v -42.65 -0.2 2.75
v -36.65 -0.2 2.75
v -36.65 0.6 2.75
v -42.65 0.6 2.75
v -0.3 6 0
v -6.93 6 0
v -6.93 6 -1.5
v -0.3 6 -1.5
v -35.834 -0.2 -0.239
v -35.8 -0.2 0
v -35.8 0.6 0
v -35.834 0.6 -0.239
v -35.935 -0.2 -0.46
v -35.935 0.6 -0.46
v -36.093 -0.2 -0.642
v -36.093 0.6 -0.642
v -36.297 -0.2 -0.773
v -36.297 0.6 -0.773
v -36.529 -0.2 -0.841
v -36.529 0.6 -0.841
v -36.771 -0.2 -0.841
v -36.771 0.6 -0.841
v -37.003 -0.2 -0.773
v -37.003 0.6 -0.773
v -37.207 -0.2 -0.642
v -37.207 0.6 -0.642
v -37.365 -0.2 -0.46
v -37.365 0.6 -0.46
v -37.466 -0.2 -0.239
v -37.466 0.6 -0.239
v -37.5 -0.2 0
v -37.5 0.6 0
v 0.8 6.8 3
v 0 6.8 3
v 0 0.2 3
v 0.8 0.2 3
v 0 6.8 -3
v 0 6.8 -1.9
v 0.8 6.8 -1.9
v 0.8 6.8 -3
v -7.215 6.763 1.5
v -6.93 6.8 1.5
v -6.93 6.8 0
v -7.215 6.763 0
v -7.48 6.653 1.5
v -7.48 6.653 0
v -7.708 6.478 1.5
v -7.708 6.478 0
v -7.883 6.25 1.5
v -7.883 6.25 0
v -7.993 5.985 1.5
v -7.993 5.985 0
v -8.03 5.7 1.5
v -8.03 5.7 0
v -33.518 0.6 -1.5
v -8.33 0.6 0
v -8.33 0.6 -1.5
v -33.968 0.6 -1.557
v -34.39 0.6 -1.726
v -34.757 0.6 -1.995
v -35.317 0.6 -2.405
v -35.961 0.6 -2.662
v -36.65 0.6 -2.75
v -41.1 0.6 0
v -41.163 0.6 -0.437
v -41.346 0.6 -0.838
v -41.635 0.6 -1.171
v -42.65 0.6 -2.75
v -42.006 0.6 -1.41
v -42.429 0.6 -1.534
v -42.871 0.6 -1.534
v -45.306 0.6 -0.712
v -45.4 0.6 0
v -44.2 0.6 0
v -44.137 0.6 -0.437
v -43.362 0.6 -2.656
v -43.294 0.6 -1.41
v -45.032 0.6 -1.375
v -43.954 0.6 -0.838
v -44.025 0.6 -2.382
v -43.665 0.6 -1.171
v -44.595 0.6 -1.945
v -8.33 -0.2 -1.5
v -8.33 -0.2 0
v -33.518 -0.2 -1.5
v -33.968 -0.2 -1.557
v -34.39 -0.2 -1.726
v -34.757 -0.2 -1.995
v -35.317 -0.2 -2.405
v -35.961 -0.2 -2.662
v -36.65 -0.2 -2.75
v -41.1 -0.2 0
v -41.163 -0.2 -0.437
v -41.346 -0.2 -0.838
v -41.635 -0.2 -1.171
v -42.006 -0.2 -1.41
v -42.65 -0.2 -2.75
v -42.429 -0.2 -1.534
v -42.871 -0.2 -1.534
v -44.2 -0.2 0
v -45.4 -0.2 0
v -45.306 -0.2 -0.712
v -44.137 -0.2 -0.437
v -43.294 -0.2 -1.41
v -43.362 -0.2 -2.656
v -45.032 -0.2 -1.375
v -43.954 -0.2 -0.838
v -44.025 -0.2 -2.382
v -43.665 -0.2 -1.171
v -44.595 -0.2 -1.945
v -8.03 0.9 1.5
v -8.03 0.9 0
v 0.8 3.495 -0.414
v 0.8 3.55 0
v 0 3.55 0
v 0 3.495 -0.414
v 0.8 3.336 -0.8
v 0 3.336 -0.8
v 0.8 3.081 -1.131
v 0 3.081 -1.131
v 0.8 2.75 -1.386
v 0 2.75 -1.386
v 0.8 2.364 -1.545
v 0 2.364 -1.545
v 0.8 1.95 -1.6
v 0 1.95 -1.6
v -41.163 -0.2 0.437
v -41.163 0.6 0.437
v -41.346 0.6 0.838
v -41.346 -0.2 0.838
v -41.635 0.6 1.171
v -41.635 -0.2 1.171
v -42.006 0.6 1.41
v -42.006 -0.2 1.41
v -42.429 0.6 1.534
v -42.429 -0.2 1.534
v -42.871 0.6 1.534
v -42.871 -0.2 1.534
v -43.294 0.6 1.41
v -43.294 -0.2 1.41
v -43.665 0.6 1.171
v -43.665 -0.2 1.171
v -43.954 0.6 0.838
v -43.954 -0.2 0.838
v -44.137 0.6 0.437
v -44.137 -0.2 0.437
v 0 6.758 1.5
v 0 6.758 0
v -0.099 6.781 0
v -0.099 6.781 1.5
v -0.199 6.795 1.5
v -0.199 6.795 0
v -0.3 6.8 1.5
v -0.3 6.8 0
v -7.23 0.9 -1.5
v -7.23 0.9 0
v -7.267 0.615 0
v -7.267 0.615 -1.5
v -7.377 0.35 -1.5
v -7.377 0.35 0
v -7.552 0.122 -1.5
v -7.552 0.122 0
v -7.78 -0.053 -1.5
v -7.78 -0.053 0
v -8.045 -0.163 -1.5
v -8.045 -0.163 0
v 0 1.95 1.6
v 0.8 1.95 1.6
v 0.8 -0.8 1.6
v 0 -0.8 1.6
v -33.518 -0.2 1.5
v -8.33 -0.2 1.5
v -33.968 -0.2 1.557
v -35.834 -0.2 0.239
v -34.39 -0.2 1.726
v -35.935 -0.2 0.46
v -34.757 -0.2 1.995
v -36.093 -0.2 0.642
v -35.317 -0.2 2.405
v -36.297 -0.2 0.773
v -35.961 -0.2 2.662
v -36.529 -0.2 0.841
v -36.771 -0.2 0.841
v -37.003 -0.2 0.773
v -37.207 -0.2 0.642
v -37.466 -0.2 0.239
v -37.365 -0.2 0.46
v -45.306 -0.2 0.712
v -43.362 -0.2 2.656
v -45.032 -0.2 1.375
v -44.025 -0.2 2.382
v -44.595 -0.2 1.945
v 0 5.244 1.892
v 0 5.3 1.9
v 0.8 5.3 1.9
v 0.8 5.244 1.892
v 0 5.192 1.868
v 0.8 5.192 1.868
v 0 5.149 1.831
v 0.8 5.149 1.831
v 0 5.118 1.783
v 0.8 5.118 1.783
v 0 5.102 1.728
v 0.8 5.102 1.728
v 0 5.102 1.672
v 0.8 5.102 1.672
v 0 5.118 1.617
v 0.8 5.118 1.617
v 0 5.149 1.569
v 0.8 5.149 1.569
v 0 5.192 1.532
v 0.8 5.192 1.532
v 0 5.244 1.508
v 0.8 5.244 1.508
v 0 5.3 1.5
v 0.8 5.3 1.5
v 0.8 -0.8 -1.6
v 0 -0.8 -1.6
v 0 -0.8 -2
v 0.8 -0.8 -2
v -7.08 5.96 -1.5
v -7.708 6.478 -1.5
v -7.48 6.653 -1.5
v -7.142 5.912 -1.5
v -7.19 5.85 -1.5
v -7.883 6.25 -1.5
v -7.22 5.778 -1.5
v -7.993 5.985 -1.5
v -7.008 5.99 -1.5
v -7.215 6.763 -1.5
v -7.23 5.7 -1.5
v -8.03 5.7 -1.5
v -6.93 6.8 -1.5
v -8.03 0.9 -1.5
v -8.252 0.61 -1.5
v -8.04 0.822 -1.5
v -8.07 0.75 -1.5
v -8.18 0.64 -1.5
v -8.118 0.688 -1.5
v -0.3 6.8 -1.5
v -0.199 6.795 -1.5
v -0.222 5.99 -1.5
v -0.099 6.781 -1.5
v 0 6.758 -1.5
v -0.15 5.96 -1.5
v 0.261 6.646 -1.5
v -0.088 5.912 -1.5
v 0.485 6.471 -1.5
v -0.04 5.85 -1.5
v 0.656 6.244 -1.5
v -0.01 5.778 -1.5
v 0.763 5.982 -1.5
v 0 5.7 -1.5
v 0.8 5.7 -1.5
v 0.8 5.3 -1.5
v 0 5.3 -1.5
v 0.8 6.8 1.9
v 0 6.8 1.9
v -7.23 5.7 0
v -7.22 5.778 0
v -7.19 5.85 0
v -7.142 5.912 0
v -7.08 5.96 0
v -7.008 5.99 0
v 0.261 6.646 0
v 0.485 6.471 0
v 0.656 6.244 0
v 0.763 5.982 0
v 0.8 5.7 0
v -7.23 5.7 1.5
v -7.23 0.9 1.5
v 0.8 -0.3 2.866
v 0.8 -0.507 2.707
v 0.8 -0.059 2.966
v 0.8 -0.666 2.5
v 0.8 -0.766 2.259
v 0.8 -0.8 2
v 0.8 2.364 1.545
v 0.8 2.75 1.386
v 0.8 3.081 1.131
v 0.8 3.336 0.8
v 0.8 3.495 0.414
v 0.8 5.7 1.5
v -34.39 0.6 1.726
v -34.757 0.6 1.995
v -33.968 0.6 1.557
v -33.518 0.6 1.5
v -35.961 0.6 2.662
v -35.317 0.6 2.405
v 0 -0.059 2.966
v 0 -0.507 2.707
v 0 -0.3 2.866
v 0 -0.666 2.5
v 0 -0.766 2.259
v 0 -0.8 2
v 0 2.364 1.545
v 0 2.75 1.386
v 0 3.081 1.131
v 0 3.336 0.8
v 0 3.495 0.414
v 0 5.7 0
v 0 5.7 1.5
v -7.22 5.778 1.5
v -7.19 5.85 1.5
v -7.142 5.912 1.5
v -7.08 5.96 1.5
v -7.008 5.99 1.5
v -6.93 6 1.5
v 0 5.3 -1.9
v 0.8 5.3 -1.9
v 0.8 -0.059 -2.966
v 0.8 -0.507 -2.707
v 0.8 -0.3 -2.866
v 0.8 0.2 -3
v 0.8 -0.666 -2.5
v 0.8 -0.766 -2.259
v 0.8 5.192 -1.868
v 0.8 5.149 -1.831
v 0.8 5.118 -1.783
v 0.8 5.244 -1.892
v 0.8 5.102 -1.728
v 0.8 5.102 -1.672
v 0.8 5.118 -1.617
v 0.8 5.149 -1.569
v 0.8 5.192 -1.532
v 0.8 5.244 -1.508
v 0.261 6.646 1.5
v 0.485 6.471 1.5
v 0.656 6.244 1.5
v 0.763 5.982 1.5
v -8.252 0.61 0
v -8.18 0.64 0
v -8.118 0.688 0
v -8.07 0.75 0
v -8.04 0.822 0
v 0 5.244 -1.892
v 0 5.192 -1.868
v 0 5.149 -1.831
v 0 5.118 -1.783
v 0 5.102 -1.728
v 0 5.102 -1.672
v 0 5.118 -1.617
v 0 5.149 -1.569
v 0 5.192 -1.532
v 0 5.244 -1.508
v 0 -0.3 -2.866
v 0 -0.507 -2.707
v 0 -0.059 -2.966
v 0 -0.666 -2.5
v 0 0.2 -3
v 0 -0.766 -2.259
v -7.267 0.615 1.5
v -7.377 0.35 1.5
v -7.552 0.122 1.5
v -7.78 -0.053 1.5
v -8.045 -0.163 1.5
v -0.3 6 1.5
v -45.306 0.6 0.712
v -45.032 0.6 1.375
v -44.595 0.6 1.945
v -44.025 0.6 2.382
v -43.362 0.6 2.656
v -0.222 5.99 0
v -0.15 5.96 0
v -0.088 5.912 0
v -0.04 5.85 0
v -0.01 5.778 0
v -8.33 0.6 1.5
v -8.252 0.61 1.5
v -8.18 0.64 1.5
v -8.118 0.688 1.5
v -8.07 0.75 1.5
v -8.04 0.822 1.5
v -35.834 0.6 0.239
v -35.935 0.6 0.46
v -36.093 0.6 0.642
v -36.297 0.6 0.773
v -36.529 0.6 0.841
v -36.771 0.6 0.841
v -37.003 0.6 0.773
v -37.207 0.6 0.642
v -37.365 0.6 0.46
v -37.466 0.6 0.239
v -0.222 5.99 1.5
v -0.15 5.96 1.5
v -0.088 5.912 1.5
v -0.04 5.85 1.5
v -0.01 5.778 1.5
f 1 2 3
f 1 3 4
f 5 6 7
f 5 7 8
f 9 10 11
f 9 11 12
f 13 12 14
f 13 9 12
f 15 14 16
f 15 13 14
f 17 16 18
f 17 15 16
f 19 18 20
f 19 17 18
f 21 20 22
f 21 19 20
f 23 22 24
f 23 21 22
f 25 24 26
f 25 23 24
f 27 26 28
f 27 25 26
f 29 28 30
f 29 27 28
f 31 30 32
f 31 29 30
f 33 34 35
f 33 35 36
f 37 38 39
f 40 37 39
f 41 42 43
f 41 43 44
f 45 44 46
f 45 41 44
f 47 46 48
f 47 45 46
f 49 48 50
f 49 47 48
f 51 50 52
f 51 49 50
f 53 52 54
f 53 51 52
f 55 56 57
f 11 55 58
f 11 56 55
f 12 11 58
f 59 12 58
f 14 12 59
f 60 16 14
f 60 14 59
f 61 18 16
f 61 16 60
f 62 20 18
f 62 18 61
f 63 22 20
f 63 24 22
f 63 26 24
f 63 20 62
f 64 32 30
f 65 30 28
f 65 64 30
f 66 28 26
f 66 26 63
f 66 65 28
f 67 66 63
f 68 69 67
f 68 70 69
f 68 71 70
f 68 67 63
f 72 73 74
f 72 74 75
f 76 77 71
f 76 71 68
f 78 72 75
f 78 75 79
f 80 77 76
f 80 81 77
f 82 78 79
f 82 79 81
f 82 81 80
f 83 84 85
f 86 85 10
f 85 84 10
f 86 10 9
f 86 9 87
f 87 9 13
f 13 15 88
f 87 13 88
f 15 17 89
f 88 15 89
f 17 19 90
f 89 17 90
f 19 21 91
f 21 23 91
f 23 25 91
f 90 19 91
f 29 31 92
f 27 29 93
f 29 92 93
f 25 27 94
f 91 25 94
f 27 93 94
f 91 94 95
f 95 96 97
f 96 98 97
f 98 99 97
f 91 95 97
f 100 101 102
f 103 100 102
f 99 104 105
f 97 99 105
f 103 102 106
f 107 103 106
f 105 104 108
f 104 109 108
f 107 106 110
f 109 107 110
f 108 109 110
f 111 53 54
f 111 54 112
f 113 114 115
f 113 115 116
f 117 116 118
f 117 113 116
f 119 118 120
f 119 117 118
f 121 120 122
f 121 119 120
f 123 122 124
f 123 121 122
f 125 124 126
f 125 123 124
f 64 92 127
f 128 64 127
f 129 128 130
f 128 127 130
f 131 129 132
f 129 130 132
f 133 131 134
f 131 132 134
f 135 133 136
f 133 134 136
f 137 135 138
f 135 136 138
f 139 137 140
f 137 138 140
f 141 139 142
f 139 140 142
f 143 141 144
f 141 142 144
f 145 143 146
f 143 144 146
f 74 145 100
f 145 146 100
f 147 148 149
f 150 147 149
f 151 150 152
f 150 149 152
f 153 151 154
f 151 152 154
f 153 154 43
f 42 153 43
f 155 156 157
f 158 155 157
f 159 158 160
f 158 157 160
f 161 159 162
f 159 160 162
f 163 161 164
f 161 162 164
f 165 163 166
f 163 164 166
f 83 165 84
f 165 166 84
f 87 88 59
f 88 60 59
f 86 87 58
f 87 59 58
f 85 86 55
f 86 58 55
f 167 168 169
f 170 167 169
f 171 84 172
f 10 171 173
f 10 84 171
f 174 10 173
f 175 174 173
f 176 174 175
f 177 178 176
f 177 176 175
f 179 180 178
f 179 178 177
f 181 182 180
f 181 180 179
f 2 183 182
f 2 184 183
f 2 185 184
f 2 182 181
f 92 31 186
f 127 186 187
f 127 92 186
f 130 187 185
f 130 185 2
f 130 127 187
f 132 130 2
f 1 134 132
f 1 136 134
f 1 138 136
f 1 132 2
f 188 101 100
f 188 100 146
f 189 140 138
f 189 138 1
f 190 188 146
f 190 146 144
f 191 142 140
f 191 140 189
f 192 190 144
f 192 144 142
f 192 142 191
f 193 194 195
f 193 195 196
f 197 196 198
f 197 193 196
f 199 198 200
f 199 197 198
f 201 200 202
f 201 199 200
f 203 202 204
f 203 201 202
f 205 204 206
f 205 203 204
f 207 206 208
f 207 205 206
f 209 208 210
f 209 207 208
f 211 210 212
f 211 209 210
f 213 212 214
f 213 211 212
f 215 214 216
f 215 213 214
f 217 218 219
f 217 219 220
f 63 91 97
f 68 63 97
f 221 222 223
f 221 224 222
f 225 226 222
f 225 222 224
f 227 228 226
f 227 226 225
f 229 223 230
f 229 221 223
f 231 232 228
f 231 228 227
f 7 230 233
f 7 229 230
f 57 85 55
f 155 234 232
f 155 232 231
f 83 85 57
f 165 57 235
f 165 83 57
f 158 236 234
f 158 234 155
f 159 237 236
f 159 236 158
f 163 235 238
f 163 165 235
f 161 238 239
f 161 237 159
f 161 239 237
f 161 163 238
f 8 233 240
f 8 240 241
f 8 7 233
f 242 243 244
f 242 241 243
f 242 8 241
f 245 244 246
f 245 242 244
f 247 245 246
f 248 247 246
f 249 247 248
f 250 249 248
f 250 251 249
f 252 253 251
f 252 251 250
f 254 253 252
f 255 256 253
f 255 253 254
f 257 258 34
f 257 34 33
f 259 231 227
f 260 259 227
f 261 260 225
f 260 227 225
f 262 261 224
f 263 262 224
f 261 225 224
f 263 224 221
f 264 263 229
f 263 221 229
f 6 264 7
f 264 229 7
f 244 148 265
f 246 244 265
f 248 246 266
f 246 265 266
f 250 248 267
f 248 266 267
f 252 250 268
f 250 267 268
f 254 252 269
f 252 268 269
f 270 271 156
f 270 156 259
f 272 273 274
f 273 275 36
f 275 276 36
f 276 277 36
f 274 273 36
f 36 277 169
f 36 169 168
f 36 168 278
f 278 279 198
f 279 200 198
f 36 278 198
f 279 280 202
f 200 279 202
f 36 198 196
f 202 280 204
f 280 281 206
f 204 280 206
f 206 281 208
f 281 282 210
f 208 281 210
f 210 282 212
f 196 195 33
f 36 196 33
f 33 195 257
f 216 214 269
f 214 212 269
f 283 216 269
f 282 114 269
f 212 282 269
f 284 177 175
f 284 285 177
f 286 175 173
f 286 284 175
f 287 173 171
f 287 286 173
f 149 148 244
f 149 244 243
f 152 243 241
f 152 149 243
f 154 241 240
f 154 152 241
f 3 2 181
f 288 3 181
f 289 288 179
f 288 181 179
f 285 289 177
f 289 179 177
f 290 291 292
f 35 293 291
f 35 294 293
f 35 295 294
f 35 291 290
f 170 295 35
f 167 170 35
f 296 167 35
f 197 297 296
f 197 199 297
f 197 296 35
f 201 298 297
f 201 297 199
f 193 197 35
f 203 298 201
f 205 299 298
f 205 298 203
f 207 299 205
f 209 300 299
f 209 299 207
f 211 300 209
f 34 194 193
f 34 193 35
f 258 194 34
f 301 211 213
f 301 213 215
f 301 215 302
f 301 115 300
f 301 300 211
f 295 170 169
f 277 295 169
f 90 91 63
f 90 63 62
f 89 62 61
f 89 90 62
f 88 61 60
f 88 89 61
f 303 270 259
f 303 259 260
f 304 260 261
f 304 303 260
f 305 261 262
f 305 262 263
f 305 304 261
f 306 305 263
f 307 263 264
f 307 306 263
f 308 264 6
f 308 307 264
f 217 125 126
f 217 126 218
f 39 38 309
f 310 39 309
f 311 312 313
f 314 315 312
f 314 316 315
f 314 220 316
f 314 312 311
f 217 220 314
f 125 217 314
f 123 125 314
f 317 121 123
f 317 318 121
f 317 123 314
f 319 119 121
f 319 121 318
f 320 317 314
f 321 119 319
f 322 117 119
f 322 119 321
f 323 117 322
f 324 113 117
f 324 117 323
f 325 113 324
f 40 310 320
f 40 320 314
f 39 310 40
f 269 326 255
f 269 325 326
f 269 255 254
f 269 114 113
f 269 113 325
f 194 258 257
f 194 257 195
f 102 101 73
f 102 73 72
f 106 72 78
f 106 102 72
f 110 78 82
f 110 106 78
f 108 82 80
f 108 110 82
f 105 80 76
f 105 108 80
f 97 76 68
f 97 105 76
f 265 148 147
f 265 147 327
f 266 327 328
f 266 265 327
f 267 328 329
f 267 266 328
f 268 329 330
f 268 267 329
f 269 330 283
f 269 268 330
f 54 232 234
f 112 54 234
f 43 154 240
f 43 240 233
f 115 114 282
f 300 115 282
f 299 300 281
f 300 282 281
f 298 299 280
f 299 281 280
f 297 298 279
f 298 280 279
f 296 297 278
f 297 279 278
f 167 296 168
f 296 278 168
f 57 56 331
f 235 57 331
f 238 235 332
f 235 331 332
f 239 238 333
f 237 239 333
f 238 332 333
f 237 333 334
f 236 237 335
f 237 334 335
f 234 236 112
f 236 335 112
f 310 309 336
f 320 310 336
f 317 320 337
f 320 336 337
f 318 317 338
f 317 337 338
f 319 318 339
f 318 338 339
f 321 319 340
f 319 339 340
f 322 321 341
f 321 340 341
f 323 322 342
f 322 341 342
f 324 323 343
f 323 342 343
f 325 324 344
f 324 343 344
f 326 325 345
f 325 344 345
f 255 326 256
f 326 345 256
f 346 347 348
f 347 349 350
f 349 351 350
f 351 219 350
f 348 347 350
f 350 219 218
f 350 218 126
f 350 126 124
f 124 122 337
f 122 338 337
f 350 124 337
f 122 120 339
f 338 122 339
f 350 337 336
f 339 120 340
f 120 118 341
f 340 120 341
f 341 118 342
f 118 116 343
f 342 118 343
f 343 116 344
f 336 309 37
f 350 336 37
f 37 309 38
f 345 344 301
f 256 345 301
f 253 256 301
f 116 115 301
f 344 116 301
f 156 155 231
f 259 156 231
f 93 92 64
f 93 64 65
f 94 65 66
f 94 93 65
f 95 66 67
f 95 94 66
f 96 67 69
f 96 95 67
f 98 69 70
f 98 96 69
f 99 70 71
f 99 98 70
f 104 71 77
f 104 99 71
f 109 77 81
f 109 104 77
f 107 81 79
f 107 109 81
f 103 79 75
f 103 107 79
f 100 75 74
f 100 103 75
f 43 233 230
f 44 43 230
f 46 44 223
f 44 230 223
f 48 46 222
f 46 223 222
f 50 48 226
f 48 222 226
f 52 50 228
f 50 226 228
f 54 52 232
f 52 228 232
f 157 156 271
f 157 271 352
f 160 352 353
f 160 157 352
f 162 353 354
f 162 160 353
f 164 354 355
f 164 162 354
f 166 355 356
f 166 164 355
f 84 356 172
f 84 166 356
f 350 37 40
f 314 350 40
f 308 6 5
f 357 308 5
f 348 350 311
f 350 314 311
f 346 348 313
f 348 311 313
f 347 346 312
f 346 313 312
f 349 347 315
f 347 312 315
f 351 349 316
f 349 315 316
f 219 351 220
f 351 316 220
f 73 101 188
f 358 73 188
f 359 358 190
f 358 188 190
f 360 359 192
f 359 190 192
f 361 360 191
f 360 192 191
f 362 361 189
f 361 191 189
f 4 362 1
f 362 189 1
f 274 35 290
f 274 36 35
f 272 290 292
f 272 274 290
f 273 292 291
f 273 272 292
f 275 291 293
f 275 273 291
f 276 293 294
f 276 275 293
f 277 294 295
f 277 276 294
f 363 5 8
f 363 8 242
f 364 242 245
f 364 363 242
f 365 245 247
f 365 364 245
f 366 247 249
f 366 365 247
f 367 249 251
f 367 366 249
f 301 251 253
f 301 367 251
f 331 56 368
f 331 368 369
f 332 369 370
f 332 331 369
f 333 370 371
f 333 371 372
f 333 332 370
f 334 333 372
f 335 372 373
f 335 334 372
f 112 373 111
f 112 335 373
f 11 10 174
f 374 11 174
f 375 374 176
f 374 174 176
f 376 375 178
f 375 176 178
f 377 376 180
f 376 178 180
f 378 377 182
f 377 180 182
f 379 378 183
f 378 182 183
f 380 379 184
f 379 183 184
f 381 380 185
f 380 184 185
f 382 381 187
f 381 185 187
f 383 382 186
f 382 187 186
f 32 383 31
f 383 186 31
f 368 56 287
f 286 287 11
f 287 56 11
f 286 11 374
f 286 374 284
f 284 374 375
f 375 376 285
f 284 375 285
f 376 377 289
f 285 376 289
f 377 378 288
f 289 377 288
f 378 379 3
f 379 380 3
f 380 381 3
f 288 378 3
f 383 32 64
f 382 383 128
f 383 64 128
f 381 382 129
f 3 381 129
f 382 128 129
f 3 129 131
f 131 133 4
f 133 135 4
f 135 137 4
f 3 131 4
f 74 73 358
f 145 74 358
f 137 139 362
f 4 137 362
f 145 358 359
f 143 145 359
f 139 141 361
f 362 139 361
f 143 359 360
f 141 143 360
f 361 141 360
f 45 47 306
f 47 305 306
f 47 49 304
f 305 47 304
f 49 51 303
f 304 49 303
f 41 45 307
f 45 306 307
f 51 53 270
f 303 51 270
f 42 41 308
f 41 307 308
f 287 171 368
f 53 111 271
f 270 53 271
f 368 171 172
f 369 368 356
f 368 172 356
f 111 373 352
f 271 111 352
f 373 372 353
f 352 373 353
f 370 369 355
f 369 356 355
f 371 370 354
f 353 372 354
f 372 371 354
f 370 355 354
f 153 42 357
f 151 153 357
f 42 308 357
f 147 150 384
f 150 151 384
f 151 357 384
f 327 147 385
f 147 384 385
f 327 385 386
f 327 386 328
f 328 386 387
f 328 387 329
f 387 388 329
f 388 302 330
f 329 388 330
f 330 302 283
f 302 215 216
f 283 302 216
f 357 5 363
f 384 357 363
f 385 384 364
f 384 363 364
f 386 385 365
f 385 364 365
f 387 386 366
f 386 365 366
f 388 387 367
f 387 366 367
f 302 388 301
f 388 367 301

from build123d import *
from build123d.topology import SkipClean

# Parameters (mm, degrees)
SKETCH_20_W                      = 0.8
SKETCH_20_H                      = 7.6
SM_BASE_FLANGE_3_DEPTH           = 3
SM_EDGE_FLANGE_4_DEPTH           = 1.9
SM_EDGE_FLANGE_4_2_DEPTH         = 1.5
SM_EDGE_FLANGE_4_3_DEPTH         = 2
SM_EDGE_FLANGE_5_STRIP_W         = 3.8
SM_EDGE_FLANGE_5_STRIP_H         = 0.8
SM_EDGE_FLANGE_5_STRIP_CUT_DEPTH = 1.5
SM_EDGE_FLANGE_5_DEPTH           = 1.5
SM_EDGE_FLANGE_6_STRIP_W         = 3.8
SM_EDGE_FLANGE_6_STRIP_H         = 0.8
SM_EDGE_FLANGE_6_STRIP_CUT_DEPTH = 1.5
SM_EDGE_FLANGE_6_DEPTH           = 1.5
SM_EDGE_FLANGE_6_PROFILE_W       = 2.75
SM_EDGE_FLANGE_6_PROFILE_H       = 37.07
SM_EDGE_FLANGE_6_FLAT_DEPTH      = 0.8
CUT_EXTRUDE_3_DEPTH              = 47.034335012
CUT_EXTRUDE_4_REACH              = 48.794
FILLET_1_R                       = 1.8
FILLET_2_R                       = 1


with BuildPart() as part:
    # 基体-法兰3: sheet metal written as solids
    # 草图20 → 基体-法兰3 (new body)
    with BuildSketch(Plane.XY):
        with Locations((0.4, 3)):
            Rectangle(SKETCH_20_W, SKETCH_20_H)
    extrude(amount=SM_BASE_FLANGE_3_DEPTH)

    # 边线-法兰4: read off the stored shape, not the designer's step
    # 边线-法兰4 outline → 边线-法兰4 (cut)
    with BuildSketch(Plane.XY):
        with BuildLine():
            Line((0, 6.8), (0, 6.758300524))
            ThreePointArc((0, 6.758300524), (0.577496438, 6.363324958), (0.8, 5.7))
            Line((0.8, 5.7), (0.8, 6.8))
            Line((0.8, 6.8), (0, 6.8))
        make_face()
    extrude(amount=SM_EDGE_FLANGE_4_DEPTH, mode=Mode.SUBTRACT)

    # Sm Edge Flange 4 2 outline → Sm Edge Flange 4 2 (add)
    with BuildSketch(Plane.XY):
        with BuildLine():
            Line((-0.3, 6.8), (-8.03, 6.8))
            Line((-8.03, 6.8), (-8.03, 6))
            Line((-8.03, 6), (-0.3, 6))
            ThreePointArc((-0.3, 6), (-0.087867966, 5.912132034), (0, 5.7))
            Line((0, 5.7), (0, 6.758300524))
            ThreePointArc((0, 6.758300524), (-0.148557894, 6.789525258), (-0.3, 6.8))
        make_face()
    extrude(amount=SM_EDGE_FLANGE_4_2_DEPTH)

    # Sm Edge Flange 4 3 outline → Sm Edge Flange 4 3 (cut)
    with BuildSketch(Plane.YZ):
        with BuildLine():
            Line((5.3, 1.5), (8, 1.5))
            Line((8, 1.5), (8, 1.9))
            Line((8, 1.9), (5.3, 1.9))
            ThreePointArc((5.3, 1.9), (5.1, 1.7), (5.3, 1.5))
        make_face()
    extrude(amount=SM_EDGE_FLANGE_4_3_DEPTH, mode=Mode.SUBTRACT)

    # 边线-法兰5: sheet metal written as solids
    # 边线-法兰5 strip (on a plane across the edge) → 边线-法兰5 strip cut (cut)
    with BuildSketch(Plane(origin=(-8.03, 6, 1.5), x_dir=(1, 0, 0), z_dir=(0, 0, -1))):
        with Locations((-0.8, -0.4)):
            Rectangle(SM_EDGE_FLANGE_5_STRIP_W, SM_EDGE_FLANGE_5_STRIP_H)
    extrude(amount=SM_EDGE_FLANGE_5_STRIP_CUT_DEPTH, mode=Mode.SUBTRACT)

    # 边线-法兰5 section (on a plane across the edge) → 边线-法兰5 (add)
    with BuildSketch(Plane(origin=(-8.03, 6, 1.5), x_dir=(1, 0, 0), z_dir=(0, 0, -1))):
        with BuildLine():
            Line((0, 0.3), (0, 6.2))
            Line((0, 6.2), (0.8, 6.2))
            Line((0.8, 6.2), (0.8, 0.3))
            ThreePointArc((0.8, 0.3), (0.887867966, 0.087867966), (1.1, 0))
            Line((1.1, 0), (1.1, -0.8))
            ThreePointArc((1.1, -0.8), (0.322182541, -0.477817459), (0, 0.3))
        make_face()
    extrude(amount=SM_EDGE_FLANGE_5_DEPTH)

    # 边线-法兰6: sheet metal written as solids
    # 边线-法兰6 strip (on a plane across the edge) → 边线-法兰6 strip cut (cut)
    with BuildSketch(Plane(origin=(-8.03, -0.2, 0), x_dir=(0, 1, 0), z_dir=(0, 0, 1))):
        with Locations((-0.8, -0.4)):
            Rectangle(SM_EDGE_FLANGE_6_STRIP_W, SM_EDGE_FLANGE_6_STRIP_H)
    extrude(amount=SM_EDGE_FLANGE_6_STRIP_CUT_DEPTH, mode=Mode.SUBTRACT)

    # 边线-法兰6 bend section (on a plane across the edge) → 边线-法兰6 (add)
    with BuildSketch(Plane(origin=(-8.03, -0.2, 0), x_dir=(0, 1, 0), z_dir=(0, 0, 1))):
        with BuildLine():
            Line((0, 0.3), (0.8, 0.3))
            ThreePointArc((0.8, 0.3), (0.887867966, 0.087867966), (1.1, 0))
            Line((1.1, 0), (1.1, -0.8))
            ThreePointArc((1.1, -0.8), (0.322182541, -0.477817459), (0, 0.3))
        make_face()
    extrude(amount=SM_EDGE_FLANGE_6_DEPTH)

    # 边线-法兰6 profile (on flange) → 边线-法兰6 flat (add)
    with BuildSketch(Plane(origin=(-8.03, -0.2, 0), x_dir=(0, 0, 1), z_dir=(0, -1, 0))):
        with Locations((1.375, 18.835)):
            Rectangle(SM_EDGE_FLANGE_6_PROFILE_W, SM_EDGE_FLANGE_6_PROFILE_H)
    extrude(amount=-SM_EDGE_FLANGE_6_FLAT_DEPTH)

    # 草图37 → 切除-拉伸3 (cut, through all)
    with BuildSketch(Plane.XZ.offset(0.2)):
        with BuildLine():
            Line((-34.345113886, 1.5), (-8.33, 1.5))
            Line((-8.33, 1.5), (-8.33, 2.75))
            Line((-8.33, 2.75), (-36.65, 2.75))
            ThreePointArc((-36.65, 2.75), (-35.33898894, 2.417384951), (-34.345113886, 1.5))
        make_face()
        with BuildLine():
            Line((-37.5, 0), (-35.8, 0))
            ThreePointArc((-35.8, 0), (-36.65, 0.85), (-37.5, 0))
        make_face()
        with BuildLine():
            ThreePointArc((-45.4, 0), (-44.594543648, 1.944543648), (-42.65, 2.75))
            Line((-42.65, 2.75), (-45.4, 2.75))
            Line((-45.4, 2.75), (-45.4, 0))
        make_face()
        with BuildLine():
            Line((-44.2, 0), (-41.1, 0))
            ThreePointArc((-41.1, 0), (-42.65, 1.55), (-44.2, 0))
        make_face()
    extrude(amount=-CUT_EXTRUDE_3_DEPTH, mode=Mode.SUBTRACT)

    # 草图38 → 切除-拉伸4 (cut, up to next)
    with BuildSketch(Plane(origin=(0.8, 0, 0), x_dir=(0, 0, -1), z_dir=(1, 0, 0)), mode=Mode.PRIVATE) as cut_extrude_4_sk1:
        with BuildLine():
            Line((-1.6, 1.95), (-1.6, -0.8))
            Line((-1.6, -0.8), (0, -0.8))
            Line((0, -0.8), (0, 3.55))
            ThreePointArc((0, 3.55), (-1.13137085, 3.08137085), (-1.6, 1.95))
        make_face()
    cut_extrude_4_tool1 = extrude(cut_extrude_4_sk1.sketch, amount=-CUT_EXTRUDE_4_REACH, mode=Mode.PRIVATE) & part.part
    add(cut_extrude_4_tool1.solids().sort_by_distance((0.8, 1.219233, 0.762069))[0], mode=Mode.SUBTRACT)

    # 圆角1
    fillet_1_edges = [part.edges().sort_by_distance(p)[0] for p in [
        (-34.345113886, 0.2, 1.5),
    ]]
    fillet(fillet_1_edges, radius=FILLET_1_R)

    # 圆角2
    fillet_2_edges = [part.edges().sort_by_distance(p)[0] for p in [
        (0.4, -0.8, 3),
    ]]
    fillet(fillet_2_edges, radius=FILLET_2_R)

    # 镜向1: part across plane


with BuildPart() as part_1:
    with SkipClean():  # the faces are left unmerged after this step: merging them gives an invalid solid
        add(part.part)
        add(part.part.mirror(Plane(origin=(-8.03, -0.2, 0), x_dir=(1, 0, 0), z_dir=(0, 0, 1))))


solid = part_1.part
